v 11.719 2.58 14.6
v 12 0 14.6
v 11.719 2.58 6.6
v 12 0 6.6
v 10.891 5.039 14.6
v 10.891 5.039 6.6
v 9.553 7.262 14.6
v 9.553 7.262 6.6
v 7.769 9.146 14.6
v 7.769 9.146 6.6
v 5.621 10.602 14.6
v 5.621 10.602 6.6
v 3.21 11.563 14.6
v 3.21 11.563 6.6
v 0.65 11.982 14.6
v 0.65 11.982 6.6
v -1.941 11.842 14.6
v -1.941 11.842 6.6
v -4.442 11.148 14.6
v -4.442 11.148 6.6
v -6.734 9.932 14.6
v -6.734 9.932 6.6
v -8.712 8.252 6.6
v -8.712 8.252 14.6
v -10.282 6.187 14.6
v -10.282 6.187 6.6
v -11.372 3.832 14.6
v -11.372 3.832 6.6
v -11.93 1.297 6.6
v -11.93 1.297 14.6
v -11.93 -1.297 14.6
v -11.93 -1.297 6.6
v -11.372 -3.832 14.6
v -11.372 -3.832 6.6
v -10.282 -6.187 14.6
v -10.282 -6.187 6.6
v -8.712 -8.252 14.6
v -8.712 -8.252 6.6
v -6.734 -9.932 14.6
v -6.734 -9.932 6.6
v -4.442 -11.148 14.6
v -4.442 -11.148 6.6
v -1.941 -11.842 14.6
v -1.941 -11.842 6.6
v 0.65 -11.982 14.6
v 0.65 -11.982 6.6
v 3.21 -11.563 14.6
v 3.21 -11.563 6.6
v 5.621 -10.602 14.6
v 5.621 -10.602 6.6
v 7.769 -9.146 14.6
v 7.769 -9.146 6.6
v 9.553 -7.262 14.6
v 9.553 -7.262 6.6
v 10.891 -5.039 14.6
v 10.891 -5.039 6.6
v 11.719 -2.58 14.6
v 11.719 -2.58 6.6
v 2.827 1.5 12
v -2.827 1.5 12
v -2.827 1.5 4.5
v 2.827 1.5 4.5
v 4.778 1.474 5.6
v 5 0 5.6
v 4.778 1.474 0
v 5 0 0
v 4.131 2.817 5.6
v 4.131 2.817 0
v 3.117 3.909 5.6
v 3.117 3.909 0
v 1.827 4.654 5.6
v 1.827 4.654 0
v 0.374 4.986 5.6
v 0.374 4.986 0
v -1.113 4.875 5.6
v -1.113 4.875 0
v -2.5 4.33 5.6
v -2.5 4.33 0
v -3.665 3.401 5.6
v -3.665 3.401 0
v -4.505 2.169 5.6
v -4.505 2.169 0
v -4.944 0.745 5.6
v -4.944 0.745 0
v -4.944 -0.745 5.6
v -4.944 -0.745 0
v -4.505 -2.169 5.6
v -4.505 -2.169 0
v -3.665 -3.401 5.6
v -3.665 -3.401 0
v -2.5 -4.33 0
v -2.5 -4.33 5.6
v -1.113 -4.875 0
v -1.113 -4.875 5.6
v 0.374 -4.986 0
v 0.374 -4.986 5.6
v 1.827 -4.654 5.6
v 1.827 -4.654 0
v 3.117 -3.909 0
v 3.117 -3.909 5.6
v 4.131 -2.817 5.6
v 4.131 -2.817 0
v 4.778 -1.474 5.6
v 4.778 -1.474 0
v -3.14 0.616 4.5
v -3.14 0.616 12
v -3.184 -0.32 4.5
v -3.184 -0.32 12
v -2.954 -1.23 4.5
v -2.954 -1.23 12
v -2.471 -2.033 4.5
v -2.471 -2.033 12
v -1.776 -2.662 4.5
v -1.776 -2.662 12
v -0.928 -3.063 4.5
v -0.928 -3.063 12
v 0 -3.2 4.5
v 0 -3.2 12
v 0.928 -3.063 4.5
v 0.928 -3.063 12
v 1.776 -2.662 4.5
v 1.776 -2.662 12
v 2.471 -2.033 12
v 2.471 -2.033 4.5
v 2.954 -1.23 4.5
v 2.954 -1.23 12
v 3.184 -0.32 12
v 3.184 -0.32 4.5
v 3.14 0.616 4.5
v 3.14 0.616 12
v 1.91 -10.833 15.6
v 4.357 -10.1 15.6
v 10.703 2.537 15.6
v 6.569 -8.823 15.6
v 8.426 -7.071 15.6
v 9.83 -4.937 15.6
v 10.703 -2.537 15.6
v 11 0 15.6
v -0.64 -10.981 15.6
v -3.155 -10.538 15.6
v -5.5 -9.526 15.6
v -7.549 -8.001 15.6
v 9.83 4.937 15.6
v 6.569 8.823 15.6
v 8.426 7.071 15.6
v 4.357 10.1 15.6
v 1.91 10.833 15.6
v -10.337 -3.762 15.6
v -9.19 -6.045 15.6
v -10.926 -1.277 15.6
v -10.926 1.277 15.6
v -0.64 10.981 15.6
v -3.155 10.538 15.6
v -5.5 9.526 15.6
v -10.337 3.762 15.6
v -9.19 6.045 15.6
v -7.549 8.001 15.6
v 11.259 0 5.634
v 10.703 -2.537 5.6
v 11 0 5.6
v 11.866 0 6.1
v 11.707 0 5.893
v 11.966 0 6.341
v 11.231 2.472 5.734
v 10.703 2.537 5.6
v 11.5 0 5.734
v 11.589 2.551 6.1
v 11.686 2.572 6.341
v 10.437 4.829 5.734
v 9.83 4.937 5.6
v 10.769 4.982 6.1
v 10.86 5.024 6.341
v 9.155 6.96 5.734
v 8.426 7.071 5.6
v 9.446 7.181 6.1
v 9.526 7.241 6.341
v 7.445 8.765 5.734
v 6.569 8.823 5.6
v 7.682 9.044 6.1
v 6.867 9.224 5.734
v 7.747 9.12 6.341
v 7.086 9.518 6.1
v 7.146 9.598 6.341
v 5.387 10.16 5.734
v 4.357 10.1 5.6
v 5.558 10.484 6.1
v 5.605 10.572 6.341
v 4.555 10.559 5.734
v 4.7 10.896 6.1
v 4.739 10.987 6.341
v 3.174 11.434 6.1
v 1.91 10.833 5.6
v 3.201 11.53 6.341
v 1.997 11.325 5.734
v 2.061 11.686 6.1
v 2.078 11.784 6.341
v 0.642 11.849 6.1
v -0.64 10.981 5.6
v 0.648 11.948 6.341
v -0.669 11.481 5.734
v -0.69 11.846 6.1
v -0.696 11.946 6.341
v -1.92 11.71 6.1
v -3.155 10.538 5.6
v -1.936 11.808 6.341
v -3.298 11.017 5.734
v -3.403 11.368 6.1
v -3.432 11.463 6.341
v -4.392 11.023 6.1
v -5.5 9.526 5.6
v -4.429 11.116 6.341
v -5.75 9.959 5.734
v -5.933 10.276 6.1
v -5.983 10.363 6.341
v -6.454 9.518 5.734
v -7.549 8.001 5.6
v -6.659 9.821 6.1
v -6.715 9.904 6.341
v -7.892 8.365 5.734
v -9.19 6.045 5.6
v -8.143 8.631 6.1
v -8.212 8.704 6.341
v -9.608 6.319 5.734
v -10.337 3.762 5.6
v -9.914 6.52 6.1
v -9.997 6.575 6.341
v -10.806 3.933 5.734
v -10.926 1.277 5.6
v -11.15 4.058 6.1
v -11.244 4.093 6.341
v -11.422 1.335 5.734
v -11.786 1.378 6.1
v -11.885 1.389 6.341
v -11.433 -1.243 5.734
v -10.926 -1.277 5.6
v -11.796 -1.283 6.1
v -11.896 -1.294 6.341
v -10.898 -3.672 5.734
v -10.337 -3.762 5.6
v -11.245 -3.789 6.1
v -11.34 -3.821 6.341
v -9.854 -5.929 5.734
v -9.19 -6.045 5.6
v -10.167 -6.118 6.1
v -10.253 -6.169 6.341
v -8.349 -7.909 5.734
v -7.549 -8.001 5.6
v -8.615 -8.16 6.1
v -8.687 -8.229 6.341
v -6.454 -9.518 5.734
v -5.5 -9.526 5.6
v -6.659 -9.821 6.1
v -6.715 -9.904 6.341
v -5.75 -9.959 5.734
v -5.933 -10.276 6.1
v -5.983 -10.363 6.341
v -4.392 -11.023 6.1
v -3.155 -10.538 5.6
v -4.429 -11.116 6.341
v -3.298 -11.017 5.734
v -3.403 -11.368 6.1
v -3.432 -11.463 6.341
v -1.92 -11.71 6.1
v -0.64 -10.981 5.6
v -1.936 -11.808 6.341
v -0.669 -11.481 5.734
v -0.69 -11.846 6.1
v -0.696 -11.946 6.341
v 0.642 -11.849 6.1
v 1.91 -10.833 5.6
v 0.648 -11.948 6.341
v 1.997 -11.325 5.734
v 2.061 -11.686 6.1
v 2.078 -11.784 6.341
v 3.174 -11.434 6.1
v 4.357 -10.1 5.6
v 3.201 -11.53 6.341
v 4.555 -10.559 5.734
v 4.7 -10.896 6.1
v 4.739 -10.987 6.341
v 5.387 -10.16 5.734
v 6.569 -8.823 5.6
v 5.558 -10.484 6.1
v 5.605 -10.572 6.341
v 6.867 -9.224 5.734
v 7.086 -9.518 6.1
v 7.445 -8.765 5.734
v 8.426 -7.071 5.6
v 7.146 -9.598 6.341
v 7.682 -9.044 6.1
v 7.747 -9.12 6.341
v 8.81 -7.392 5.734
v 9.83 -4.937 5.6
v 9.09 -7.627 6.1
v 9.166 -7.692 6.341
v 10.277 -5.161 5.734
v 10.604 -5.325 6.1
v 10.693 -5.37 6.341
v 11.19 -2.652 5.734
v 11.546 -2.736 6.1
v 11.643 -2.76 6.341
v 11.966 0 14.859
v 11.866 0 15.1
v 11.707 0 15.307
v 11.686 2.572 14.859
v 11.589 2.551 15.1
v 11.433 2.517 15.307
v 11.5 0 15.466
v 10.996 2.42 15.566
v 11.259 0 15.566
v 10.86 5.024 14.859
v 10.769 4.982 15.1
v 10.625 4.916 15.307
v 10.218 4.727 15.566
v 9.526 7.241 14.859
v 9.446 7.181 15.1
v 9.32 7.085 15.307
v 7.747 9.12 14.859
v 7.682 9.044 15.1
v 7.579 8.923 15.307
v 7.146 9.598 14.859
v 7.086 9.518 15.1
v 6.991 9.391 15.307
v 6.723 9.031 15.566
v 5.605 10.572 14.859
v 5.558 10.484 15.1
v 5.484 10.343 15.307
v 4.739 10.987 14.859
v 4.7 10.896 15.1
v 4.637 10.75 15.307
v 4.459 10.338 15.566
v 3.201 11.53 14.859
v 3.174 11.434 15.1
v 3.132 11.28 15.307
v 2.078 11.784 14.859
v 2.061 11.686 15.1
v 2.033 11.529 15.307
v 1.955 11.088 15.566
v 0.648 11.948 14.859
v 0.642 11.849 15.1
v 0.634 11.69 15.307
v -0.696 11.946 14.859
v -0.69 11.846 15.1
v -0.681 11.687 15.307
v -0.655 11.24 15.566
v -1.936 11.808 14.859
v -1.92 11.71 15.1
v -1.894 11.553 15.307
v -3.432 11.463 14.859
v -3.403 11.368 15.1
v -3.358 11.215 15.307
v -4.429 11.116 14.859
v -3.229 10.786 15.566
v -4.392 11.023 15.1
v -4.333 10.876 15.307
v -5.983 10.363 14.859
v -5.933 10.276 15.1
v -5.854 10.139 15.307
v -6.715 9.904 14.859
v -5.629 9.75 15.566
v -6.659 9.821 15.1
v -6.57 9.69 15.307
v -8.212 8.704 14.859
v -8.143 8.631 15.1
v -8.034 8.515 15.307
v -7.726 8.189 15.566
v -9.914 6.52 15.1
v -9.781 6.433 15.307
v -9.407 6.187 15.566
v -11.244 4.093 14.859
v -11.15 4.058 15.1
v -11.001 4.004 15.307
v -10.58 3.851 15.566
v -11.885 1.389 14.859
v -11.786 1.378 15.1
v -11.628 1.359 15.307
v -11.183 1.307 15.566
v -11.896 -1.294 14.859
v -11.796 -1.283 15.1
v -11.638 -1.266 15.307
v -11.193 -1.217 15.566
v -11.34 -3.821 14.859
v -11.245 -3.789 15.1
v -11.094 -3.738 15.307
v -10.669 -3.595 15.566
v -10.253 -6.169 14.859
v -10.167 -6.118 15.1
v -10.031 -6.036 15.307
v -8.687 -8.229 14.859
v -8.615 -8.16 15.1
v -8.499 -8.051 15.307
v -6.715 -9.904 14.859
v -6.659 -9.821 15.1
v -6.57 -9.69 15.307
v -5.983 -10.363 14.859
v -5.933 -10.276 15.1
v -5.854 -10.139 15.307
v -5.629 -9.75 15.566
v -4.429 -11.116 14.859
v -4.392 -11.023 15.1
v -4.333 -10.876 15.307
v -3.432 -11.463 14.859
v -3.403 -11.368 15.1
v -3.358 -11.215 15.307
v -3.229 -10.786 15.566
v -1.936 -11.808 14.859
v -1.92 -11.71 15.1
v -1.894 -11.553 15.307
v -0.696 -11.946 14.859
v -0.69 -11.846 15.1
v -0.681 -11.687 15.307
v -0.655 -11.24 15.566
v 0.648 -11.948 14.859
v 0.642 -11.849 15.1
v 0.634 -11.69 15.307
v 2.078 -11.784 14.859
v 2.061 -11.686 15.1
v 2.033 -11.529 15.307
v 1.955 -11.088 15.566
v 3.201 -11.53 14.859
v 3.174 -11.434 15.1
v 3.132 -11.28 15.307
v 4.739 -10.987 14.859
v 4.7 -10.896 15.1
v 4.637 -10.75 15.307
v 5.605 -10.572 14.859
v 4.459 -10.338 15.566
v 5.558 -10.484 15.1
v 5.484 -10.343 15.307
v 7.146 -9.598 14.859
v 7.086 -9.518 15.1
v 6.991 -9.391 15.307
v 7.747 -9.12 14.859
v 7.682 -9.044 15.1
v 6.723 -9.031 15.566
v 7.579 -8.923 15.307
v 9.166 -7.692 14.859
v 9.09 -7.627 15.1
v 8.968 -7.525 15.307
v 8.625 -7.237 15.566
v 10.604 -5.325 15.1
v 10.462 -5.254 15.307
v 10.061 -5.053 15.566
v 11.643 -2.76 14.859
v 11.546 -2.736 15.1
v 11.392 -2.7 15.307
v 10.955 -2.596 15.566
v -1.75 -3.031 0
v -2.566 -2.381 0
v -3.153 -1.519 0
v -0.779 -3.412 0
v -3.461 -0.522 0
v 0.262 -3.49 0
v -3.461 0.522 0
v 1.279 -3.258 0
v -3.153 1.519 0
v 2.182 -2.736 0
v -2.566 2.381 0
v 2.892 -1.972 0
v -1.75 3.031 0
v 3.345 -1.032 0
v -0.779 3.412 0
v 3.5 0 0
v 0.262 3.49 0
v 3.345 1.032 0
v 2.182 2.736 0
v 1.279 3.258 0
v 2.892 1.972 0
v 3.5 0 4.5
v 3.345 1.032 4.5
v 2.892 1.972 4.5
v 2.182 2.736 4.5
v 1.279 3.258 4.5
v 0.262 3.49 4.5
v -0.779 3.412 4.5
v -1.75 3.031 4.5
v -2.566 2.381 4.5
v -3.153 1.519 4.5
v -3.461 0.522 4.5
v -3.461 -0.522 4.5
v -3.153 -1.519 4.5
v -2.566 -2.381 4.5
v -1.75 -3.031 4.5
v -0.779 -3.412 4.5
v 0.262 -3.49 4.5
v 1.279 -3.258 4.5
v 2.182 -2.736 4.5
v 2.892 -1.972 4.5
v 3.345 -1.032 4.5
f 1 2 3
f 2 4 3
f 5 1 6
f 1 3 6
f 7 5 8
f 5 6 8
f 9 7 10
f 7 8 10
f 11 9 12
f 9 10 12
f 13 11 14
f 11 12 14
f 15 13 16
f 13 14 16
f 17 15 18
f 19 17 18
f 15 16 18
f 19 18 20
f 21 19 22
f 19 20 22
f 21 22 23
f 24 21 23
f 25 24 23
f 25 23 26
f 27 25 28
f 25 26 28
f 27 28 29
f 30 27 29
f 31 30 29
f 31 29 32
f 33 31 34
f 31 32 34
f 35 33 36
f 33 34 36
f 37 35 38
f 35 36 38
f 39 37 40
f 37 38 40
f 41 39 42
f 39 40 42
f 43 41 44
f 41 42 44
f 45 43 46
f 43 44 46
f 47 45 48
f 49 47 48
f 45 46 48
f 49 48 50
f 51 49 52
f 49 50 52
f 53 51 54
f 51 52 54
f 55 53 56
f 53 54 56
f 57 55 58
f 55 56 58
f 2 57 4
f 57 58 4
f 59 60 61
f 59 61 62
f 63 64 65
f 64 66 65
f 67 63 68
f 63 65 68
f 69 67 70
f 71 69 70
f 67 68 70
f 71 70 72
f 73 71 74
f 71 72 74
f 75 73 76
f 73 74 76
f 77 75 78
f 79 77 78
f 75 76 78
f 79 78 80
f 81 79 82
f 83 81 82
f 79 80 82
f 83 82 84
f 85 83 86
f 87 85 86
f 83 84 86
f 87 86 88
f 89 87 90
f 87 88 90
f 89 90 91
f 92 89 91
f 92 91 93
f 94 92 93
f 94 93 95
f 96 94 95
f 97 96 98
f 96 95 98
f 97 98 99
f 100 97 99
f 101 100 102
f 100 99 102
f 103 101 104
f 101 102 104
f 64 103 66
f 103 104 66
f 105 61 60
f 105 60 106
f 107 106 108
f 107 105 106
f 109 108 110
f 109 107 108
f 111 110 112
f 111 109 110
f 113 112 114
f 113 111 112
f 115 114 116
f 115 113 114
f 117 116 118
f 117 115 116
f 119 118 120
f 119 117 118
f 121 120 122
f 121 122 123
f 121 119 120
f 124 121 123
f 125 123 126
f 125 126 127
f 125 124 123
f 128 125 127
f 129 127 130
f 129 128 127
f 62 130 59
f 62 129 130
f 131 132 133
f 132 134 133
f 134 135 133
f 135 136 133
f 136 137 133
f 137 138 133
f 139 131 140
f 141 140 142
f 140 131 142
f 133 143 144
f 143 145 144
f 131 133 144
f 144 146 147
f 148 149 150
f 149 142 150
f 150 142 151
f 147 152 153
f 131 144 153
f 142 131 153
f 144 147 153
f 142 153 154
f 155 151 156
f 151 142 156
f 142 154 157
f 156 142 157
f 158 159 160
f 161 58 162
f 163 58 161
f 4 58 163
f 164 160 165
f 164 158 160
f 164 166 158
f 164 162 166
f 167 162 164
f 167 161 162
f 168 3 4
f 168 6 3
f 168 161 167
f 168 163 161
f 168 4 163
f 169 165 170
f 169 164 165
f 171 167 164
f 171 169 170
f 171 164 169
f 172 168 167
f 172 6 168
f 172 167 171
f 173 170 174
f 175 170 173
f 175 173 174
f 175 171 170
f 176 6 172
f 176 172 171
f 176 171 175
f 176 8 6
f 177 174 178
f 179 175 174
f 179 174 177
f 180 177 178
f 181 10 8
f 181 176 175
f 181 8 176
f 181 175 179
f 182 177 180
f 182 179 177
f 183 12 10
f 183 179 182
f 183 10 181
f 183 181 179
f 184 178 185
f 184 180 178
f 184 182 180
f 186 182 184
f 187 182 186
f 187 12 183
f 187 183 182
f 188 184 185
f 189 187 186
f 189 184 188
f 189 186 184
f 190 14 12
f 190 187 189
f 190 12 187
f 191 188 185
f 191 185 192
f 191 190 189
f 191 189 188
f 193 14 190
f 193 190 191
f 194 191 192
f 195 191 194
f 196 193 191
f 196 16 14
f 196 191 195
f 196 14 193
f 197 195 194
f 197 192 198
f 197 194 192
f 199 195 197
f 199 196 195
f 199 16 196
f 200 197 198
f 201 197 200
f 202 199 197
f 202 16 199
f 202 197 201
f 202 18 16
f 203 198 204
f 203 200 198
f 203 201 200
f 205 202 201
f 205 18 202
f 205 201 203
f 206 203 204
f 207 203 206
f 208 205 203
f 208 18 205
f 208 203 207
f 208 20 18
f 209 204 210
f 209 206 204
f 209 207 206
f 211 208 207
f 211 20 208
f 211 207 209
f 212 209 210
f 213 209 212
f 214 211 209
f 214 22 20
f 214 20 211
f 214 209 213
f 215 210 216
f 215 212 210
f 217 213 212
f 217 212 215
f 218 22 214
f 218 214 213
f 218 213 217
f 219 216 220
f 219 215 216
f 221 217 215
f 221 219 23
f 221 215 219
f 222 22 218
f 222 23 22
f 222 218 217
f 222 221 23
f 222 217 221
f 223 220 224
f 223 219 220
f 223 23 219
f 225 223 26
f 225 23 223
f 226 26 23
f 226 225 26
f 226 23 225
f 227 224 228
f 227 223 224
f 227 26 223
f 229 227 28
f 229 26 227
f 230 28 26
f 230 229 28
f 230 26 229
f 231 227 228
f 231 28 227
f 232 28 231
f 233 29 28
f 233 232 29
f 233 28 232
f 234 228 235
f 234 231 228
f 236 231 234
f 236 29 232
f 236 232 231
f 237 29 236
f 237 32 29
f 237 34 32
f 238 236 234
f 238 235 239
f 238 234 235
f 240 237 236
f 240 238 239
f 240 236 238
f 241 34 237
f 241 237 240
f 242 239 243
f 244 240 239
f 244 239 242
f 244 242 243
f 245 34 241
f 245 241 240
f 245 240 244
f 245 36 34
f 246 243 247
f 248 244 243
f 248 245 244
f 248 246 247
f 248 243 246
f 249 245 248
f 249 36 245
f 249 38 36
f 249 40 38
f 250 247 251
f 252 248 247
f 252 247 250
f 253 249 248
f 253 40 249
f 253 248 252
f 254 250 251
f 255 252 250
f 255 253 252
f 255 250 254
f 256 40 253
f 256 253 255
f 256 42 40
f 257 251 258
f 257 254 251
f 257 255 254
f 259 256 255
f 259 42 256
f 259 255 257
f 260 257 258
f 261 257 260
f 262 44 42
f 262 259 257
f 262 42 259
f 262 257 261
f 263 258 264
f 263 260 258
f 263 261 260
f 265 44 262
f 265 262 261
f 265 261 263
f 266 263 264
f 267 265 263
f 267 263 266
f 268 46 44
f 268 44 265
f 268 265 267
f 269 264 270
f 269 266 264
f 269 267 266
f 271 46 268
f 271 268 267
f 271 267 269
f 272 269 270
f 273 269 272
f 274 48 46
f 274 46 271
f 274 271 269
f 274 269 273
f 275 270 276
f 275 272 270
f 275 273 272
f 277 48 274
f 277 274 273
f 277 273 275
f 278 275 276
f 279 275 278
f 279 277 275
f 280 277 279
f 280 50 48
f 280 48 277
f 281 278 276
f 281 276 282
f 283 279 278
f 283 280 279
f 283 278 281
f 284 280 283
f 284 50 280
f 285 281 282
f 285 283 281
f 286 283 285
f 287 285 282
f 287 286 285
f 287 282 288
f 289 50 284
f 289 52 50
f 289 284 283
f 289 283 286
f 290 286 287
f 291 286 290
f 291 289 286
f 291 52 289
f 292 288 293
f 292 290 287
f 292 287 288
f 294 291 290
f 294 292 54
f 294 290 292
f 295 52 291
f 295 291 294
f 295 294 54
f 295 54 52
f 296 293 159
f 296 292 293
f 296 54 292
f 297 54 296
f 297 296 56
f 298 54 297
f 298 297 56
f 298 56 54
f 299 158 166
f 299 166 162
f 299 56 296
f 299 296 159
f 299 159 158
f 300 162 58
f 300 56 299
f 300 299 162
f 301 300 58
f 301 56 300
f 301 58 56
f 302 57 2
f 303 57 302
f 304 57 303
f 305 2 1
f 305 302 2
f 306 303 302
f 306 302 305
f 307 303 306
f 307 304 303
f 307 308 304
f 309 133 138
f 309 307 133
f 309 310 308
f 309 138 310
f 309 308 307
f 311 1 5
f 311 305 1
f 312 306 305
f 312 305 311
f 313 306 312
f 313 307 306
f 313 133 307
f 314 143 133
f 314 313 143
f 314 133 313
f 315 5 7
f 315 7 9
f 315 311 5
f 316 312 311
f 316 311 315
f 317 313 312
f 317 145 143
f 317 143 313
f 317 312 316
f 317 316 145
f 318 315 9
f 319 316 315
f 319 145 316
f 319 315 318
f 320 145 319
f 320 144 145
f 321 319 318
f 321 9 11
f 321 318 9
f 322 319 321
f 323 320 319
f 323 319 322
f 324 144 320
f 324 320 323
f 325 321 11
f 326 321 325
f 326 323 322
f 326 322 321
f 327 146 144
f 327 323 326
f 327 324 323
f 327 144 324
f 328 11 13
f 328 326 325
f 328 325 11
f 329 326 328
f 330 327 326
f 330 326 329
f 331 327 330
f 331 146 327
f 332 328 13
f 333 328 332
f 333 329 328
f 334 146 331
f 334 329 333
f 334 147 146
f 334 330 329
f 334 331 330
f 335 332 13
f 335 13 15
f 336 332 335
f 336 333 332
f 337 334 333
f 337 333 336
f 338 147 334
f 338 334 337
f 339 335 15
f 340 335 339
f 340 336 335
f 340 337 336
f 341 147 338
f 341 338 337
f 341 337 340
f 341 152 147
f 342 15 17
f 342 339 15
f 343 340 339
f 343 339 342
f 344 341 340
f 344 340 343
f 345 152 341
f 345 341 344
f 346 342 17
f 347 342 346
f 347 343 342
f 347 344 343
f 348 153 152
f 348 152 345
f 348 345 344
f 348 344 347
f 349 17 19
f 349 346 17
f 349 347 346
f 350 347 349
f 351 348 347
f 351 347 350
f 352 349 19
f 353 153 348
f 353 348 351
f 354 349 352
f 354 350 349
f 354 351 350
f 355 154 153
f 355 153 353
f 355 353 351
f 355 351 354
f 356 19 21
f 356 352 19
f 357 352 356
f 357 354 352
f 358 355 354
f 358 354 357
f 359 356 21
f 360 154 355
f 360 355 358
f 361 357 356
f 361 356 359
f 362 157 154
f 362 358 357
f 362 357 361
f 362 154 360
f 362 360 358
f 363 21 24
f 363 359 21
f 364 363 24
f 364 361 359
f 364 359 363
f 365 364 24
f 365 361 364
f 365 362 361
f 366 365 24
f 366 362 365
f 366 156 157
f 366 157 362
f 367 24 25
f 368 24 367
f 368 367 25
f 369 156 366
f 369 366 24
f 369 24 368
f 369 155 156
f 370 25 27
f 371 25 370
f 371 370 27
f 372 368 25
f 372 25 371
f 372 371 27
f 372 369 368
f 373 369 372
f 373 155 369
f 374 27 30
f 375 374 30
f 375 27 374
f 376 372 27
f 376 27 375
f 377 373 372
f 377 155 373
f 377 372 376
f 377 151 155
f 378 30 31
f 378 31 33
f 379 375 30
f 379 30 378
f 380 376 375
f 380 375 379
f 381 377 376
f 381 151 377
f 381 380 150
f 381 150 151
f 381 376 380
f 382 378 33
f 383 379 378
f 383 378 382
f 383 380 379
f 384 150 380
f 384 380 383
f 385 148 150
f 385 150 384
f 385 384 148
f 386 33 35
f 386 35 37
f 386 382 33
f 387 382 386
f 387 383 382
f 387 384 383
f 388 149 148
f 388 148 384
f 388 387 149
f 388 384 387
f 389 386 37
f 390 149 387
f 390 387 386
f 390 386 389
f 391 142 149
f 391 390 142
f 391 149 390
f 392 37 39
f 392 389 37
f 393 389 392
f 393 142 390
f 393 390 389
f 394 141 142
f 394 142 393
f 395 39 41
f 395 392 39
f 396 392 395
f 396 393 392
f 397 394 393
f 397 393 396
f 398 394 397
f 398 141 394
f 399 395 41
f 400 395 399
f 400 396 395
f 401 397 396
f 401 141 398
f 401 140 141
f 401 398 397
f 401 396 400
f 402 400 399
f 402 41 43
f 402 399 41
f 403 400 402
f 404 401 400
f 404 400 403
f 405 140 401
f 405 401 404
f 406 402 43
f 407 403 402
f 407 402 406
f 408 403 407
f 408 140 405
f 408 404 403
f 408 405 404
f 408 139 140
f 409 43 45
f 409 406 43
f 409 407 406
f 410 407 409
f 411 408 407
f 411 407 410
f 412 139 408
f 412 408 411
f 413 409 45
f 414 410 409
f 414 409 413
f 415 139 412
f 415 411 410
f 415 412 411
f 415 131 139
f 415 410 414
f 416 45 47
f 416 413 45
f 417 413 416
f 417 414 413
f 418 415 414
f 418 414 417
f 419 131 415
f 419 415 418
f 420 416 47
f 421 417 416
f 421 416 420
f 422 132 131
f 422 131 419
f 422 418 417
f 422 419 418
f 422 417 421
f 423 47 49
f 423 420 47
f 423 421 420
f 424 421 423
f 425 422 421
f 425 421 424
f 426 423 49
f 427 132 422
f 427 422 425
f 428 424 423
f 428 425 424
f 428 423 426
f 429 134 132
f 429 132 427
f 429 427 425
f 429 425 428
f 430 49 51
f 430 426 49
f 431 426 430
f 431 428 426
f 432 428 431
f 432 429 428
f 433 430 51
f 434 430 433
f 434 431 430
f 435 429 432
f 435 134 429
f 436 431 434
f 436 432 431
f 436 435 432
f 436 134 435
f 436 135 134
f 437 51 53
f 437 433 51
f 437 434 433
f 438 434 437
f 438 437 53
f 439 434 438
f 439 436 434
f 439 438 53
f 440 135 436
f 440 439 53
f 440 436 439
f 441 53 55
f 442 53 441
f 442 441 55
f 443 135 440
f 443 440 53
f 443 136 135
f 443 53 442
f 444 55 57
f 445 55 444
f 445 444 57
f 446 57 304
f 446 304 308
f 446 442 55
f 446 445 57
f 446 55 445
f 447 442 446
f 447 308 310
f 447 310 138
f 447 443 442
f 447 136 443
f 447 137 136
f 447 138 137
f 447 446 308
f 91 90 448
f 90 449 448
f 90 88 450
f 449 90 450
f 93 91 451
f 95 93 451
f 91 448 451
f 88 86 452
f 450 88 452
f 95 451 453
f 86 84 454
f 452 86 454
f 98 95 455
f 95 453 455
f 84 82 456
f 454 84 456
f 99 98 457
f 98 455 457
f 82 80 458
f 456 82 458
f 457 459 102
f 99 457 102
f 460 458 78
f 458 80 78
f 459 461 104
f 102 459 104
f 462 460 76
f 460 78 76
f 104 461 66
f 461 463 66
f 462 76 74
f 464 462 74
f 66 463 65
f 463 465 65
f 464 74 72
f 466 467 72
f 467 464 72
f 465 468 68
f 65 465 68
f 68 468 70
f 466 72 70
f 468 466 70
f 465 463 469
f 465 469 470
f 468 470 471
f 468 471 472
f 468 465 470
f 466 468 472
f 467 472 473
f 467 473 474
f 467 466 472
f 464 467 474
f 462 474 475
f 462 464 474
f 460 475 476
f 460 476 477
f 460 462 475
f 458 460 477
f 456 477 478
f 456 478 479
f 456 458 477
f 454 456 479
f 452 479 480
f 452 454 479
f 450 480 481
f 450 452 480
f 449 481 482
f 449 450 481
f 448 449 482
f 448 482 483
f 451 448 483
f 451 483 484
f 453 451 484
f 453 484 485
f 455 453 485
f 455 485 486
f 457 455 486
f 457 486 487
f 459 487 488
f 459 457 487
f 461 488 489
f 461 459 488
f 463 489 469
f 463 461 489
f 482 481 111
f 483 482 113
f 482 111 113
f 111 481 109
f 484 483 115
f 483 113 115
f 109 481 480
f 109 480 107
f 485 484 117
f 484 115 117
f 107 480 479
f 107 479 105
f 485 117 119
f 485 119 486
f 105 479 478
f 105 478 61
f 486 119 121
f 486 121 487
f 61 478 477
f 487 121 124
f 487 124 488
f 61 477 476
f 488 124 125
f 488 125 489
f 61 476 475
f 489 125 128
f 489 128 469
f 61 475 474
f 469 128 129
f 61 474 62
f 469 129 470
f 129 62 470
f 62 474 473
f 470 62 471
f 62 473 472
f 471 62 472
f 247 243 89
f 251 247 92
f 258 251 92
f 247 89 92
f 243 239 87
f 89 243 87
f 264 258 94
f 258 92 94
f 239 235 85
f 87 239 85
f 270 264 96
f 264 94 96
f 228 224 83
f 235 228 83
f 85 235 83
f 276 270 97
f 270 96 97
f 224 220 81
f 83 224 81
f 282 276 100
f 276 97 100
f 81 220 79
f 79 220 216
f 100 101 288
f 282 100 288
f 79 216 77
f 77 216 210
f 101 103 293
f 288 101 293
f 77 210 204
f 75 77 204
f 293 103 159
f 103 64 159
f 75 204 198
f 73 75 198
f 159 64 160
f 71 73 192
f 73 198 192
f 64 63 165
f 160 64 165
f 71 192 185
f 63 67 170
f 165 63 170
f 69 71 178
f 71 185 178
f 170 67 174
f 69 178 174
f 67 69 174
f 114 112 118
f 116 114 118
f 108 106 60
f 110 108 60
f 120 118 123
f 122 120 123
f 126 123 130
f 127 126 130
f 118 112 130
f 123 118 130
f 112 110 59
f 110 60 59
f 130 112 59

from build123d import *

# Parameters (mm, degrees)
POCKET_DEPTH    = 12
SKETCH001_R     = 3.5
POCKET001_DEPTH = 4.5


with BuildPart() as part:
    # Sketch_knob → Revolution (revolve)
    with BuildSketch(Plane.XZ):
        with BuildLine():
            Line((0, 0), (0, 15.6))
            Line((0, 15.6), (11, 15.6))
            ThreePointArc((12, 14.6), (11.707107, 15.307107), (11, 15.6))
            Line((12, 14.6), (12, 6.6))
            ThreePointArc((11, 5.6), (11.707107, 5.892893), (12, 6.6))
            Line((11, 5.6), (5, 5.6))
            Line((5, 5.6), (5, 0))
            Line((5, 0), (0, 0))
        make_face()
    revolve(axis=Axis((0, 0, 0), (0, 0, 1)))

    # Sketch → Pocket (cut)
    with BuildSketch(Plane.XY):
        with BuildLine():
            ThreePointArc((-2.826659, 1.5), (0, -3.2), (2.826659, 1.5))
            Line((-2.826659, 1.5), (2.826659, 1.5))
        make_face()
    extrude(amount=POCKET_DEPTH, mode=Mode.SUBTRACT)

    # Sketch001 → Pocket001 (cut)
    with BuildSketch(Plane.XY):
        Circle(SKETCH001_R)
    extrude(amount=POCKET001_DEPTH, mode=Mode.SUBTRACT)


solid = part.part
